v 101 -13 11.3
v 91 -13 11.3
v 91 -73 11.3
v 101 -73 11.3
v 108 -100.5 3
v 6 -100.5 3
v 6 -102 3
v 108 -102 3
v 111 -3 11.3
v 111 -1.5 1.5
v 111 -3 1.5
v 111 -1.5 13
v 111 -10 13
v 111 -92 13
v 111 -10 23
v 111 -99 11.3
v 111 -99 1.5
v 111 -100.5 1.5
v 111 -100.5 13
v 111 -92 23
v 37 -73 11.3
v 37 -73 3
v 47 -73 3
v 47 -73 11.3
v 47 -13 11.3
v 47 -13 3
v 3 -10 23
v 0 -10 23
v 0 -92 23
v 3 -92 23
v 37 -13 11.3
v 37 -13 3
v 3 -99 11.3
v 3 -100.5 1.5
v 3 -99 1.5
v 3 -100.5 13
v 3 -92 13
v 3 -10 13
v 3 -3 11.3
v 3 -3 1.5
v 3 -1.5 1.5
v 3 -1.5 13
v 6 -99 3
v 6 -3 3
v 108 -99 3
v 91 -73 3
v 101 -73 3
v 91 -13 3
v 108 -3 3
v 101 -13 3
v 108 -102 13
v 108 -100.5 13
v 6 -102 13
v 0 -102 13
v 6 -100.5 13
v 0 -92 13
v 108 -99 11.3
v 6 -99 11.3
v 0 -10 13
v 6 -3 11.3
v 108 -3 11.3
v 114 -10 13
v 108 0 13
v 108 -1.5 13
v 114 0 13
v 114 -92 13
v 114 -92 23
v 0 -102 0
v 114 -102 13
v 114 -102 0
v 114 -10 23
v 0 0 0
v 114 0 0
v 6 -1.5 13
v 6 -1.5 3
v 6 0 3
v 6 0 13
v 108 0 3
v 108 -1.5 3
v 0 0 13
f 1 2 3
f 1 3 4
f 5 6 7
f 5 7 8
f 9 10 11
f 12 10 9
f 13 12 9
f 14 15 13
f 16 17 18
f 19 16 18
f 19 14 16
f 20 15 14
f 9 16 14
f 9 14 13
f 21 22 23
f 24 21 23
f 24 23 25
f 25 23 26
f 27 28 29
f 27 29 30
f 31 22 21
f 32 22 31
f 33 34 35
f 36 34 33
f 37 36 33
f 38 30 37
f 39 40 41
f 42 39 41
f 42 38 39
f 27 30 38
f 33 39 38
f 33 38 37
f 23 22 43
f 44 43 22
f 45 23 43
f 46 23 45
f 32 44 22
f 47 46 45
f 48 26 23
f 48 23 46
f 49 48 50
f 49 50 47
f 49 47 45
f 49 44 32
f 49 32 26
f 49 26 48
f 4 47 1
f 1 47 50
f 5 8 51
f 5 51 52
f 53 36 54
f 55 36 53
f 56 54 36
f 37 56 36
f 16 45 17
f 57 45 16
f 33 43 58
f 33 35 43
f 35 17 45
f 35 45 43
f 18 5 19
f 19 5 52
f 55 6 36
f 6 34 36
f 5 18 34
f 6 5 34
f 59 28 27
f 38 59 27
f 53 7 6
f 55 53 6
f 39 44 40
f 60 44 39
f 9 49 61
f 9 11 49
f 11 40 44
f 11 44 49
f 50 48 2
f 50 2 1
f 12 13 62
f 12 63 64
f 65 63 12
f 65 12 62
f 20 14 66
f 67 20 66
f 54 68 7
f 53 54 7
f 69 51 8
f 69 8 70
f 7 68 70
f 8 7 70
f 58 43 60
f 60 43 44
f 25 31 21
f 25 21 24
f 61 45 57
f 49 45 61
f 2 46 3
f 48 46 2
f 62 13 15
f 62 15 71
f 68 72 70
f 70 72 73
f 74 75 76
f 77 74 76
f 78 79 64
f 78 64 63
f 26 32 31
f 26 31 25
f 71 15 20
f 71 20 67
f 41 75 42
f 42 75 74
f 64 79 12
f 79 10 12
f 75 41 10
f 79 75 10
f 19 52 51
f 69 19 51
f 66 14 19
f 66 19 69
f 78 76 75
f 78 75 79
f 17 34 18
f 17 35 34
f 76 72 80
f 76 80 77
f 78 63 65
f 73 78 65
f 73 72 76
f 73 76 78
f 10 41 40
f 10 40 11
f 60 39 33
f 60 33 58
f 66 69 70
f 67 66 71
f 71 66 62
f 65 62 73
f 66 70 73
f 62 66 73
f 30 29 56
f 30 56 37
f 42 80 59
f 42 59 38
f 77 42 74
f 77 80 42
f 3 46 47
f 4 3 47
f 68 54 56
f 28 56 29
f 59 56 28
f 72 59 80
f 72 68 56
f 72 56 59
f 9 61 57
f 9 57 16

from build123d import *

# Parameters (mm, degrees)
SKETCH_W        = 114
SKETCH_H        = 102
PAD_DEPTH       = 3
SKETCH001_W     = 6
SKETCH001_H     = 102
PAD001_DEPTH    = 10
SKETCH002_W     = 3
SKETCH002_H     = 96
POCKET_DEPTH    = 1.7
SKETCH003_W     = 6
SKETCH003_H     = 102
PAD002_DEPTH    = 10
SKETCH004_W     = 3
SKETCH004_H     = 96
POCKET001_DEPTH = 1.7
SKETCH006_W     = 1.5
SKETCH006_H     = 10
POCKET002_DEPTH = 3
SKETCH007_W     = 1.5
SKETCH007_H     = 10
POCKET003_DEPTH = 3
SKETCH008_W     = 1.5
SKETCH008_H     = 10
POCKET004_DEPTH = 3
SKETCH009_W     = 1.5
SKETCH009_H     = 10
POCKET005_DEPTH = 3
SKETCH010_W     = 3
SKETCH010_H     = 82
PAD003_DEPTH    = 10
SKETCH011_W     = 3
SKETCH011_H     = 82
PAD004_DEPTH    = 10
SKETCH012_W     = 10
SKETCH012_H     = 60
PAD005_DEPTH    = 8.3
SKETCH013_W     = 10
SKETCH013_H     = 60
PAD006_DEPTH    = 8.3
SKETCH014_W     = 102
SKETCH014_H     = 1.5
POCKET006_DEPTH = 1.5
SKETCH015_W     = 102
SKETCH015_H     = 1.5
POCKET007_DEPTH = 1.5
SKETCH016_W     = 3
SKETCH016_H     = 1.5
POCKET008_DEPTH = 1.5
SKETCH017_W     = 3
SKETCH017_H     = 1.5
POCKET009_DEPTH = 1.5
SKETCH018_W     = 3
SKETCH018_H     = 1.5
POCKET010_DEPTH = 1.5
SKETCH019_W     = 3
SKETCH019_H     = 1.5
POCKET011_DEPTH = 1.5


with BuildPart() as part:
    # Sketch → Pad (new body)
    with BuildSketch(Plane.XY):
        with Locations((57, -51)):
            Rectangle(SKETCH_W, SKETCH_H)
    extrude(amount=PAD_DEPTH)

    # Sketch001 (on Face6 of Pad) → Pad001 (join)
    with BuildSketch(Plane.XY.offset(3)):
        with Locations((3, -51)):
            Rectangle(SKETCH001_W, SKETCH001_H)
    extrude(amount=PAD001_DEPTH)

    # Sketch002 (on Face10 of Pad001) → Pocket (cut)
    with BuildSketch(Plane.XY.offset(13)):
        with Locations((4.5, -51)):
            Rectangle(SKETCH002_W, SKETCH002_H)
    extrude(amount=-POCKET_DEPTH, mode=Mode.SUBTRACT)

    # Sketch003 (on Face6 of Pocket) → Pad002 (join)
    with BuildSketch(Plane.XY.offset(3)):
        with Locations((111, -51)):
            Rectangle(SKETCH003_W, SKETCH003_H)
    extrude(amount=PAD002_DEPTH)

    # Sketch004 (on Face14 of Pad002) → Pocket001 (cut)
    with BuildSketch(Plane.XY.offset(13)):
        with Locations((109.5, -51)):
            Rectangle(SKETCH004_W, SKETCH004_H)
    extrude(amount=-POCKET001_DEPTH, mode=Mode.SUBTRACT)

    # Sketch006 (on Face11 of Pocket001) → Pocket002 (cut)
    with BuildSketch(Plane.YZ.offset(6)):
        with Locations((-2.25, 8)):
            Rectangle(SKETCH006_W, SKETCH006_H)
    extrude(amount=-POCKET002_DEPTH, mode=Mode.SUBTRACT)

    # Sketch007 (on Face15 of Pocket002) → Pocket003 (cut)
    with BuildSketch(Plane.YZ.offset(6)):
        with Locations((-99.75, 8)):
            Rectangle(SKETCH007_W, SKETCH007_H)
    extrude(amount=-POCKET003_DEPTH, mode=Mode.SUBTRACT)

    # Sketch008 (on Face13 of Pocket003) → Pocket004 (cut)
    with BuildSketch(Plane(origin=(108, 0, 0), x_dir=(0, -1, 0), z_dir=(-1, 0, 0))):
        with Locations((2.25, 8)):
            Rectangle(SKETCH008_W, SKETCH008_H)
    extrude(amount=-POCKET004_DEPTH, mode=Mode.SUBTRACT)

    # Sketch009 (on Face15 of Pocket004) → Pocket005 (cut)
    with BuildSketch(Plane(origin=(108, 0, 0), x_dir=(0, -1, 0), z_dir=(-1, 0, 0))):
        with Locations((99.75, 8)):
            Rectangle(SKETCH009_W, SKETCH009_H)
    extrude(amount=-POCKET005_DEPTH, mode=Mode.SUBTRACT)

    # Sketch010 (on Face12 of Pocket005) → Pad003 (join)
    with BuildSketch(Plane.XY.offset(13)):
        with Locations((1.5, -51)):
            Rectangle(SKETCH010_W, SKETCH010_H)
    extrude(amount=PAD003_DEPTH)

    # Sketch011 (on Face22 of Pad003) → Pad004 (join)
    with BuildSketch(Plane.XY.offset(13)):
        with Locations((112.5, -51)):
            Rectangle(SKETCH011_W, SKETCH011_H)
    extrude(amount=PAD004_DEPTH)

    # Sketch012 (on Face6 of Pad004) → Pad005 (join)
    with BuildSketch(Plane.XY.offset(3)):
        with Locations((96, -43)):
            Rectangle(SKETCH012_W, SKETCH012_H)
    extrude(amount=PAD005_DEPTH)

    # Sketch013 (on Face6 of Pad005) → Pad006 (join)
    with BuildSketch(Plane.XY.offset(3)):
        with Locations((42, -43)):
            Rectangle(SKETCH013_W, SKETCH013_H)
    extrude(amount=PAD006_DEPTH)

    # Sketch014 (on Face6 of Pad006) → Pocket006 (cut)
    with BuildSketch(Plane.XY.offset(3)):
        with Locations((57, -99.75)):
            Rectangle(SKETCH014_W, SKETCH014_H)
    extrude(amount=-POCKET006_DEPTH, mode=Mode.SUBTRACT)

    # Sketch015 (on Face6 of Pocket006) → Pocket007 (cut)
    with BuildSketch(Plane.XY.offset(3)):
        with Locations((57, -2.25)):
            Rectangle(SKETCH015_W, SKETCH015_H)
    extrude(amount=-POCKET007_DEPTH, mode=Mode.SUBTRACT)

    # Sketch016 (on Face57 of Pocket007) → Pocket008 (cut)
    with BuildSketch(Plane.XY.offset(3)):
        with Locations((4.5, -99.75)):
            Rectangle(SKETCH016_W, SKETCH016_H)
    extrude(amount=-POCKET008_DEPTH, mode=Mode.SUBTRACT)

    # Sketch017 (on Face45 of Pocket008) → Pocket009 (cut)
    with BuildSketch(Plane.XY.offset(3)):
        with Locations((4.5, -2.25)):
            Rectangle(SKETCH017_W, SKETCH017_H)
    extrude(amount=-POCKET009_DEPTH, mode=Mode.SUBTRACT)

    # Sketch018 (on Face60 of Pocket009) → Pocket010 (cut)
    with BuildSketch(Plane.XY.offset(3)):
        with Locations((109.5, -99.75)):
            Rectangle(SKETCH018_W, SKETCH018_H)
    extrude(amount=-POCKET010_DEPTH, mode=Mode.SUBTRACT)

    # Sketch019 (on Face49 of Pocket010) → Pocket011 (cut)
    with BuildSketch(Plane.XY.offset(3)):
        with Locations((109.5, -2.25)):
            Rectangle(SKETCH019_W, SKETCH019_H)
    extrude(amount=-POCKET011_DEPTH, mode=Mode.SUBTRACT)


solid = part.part
